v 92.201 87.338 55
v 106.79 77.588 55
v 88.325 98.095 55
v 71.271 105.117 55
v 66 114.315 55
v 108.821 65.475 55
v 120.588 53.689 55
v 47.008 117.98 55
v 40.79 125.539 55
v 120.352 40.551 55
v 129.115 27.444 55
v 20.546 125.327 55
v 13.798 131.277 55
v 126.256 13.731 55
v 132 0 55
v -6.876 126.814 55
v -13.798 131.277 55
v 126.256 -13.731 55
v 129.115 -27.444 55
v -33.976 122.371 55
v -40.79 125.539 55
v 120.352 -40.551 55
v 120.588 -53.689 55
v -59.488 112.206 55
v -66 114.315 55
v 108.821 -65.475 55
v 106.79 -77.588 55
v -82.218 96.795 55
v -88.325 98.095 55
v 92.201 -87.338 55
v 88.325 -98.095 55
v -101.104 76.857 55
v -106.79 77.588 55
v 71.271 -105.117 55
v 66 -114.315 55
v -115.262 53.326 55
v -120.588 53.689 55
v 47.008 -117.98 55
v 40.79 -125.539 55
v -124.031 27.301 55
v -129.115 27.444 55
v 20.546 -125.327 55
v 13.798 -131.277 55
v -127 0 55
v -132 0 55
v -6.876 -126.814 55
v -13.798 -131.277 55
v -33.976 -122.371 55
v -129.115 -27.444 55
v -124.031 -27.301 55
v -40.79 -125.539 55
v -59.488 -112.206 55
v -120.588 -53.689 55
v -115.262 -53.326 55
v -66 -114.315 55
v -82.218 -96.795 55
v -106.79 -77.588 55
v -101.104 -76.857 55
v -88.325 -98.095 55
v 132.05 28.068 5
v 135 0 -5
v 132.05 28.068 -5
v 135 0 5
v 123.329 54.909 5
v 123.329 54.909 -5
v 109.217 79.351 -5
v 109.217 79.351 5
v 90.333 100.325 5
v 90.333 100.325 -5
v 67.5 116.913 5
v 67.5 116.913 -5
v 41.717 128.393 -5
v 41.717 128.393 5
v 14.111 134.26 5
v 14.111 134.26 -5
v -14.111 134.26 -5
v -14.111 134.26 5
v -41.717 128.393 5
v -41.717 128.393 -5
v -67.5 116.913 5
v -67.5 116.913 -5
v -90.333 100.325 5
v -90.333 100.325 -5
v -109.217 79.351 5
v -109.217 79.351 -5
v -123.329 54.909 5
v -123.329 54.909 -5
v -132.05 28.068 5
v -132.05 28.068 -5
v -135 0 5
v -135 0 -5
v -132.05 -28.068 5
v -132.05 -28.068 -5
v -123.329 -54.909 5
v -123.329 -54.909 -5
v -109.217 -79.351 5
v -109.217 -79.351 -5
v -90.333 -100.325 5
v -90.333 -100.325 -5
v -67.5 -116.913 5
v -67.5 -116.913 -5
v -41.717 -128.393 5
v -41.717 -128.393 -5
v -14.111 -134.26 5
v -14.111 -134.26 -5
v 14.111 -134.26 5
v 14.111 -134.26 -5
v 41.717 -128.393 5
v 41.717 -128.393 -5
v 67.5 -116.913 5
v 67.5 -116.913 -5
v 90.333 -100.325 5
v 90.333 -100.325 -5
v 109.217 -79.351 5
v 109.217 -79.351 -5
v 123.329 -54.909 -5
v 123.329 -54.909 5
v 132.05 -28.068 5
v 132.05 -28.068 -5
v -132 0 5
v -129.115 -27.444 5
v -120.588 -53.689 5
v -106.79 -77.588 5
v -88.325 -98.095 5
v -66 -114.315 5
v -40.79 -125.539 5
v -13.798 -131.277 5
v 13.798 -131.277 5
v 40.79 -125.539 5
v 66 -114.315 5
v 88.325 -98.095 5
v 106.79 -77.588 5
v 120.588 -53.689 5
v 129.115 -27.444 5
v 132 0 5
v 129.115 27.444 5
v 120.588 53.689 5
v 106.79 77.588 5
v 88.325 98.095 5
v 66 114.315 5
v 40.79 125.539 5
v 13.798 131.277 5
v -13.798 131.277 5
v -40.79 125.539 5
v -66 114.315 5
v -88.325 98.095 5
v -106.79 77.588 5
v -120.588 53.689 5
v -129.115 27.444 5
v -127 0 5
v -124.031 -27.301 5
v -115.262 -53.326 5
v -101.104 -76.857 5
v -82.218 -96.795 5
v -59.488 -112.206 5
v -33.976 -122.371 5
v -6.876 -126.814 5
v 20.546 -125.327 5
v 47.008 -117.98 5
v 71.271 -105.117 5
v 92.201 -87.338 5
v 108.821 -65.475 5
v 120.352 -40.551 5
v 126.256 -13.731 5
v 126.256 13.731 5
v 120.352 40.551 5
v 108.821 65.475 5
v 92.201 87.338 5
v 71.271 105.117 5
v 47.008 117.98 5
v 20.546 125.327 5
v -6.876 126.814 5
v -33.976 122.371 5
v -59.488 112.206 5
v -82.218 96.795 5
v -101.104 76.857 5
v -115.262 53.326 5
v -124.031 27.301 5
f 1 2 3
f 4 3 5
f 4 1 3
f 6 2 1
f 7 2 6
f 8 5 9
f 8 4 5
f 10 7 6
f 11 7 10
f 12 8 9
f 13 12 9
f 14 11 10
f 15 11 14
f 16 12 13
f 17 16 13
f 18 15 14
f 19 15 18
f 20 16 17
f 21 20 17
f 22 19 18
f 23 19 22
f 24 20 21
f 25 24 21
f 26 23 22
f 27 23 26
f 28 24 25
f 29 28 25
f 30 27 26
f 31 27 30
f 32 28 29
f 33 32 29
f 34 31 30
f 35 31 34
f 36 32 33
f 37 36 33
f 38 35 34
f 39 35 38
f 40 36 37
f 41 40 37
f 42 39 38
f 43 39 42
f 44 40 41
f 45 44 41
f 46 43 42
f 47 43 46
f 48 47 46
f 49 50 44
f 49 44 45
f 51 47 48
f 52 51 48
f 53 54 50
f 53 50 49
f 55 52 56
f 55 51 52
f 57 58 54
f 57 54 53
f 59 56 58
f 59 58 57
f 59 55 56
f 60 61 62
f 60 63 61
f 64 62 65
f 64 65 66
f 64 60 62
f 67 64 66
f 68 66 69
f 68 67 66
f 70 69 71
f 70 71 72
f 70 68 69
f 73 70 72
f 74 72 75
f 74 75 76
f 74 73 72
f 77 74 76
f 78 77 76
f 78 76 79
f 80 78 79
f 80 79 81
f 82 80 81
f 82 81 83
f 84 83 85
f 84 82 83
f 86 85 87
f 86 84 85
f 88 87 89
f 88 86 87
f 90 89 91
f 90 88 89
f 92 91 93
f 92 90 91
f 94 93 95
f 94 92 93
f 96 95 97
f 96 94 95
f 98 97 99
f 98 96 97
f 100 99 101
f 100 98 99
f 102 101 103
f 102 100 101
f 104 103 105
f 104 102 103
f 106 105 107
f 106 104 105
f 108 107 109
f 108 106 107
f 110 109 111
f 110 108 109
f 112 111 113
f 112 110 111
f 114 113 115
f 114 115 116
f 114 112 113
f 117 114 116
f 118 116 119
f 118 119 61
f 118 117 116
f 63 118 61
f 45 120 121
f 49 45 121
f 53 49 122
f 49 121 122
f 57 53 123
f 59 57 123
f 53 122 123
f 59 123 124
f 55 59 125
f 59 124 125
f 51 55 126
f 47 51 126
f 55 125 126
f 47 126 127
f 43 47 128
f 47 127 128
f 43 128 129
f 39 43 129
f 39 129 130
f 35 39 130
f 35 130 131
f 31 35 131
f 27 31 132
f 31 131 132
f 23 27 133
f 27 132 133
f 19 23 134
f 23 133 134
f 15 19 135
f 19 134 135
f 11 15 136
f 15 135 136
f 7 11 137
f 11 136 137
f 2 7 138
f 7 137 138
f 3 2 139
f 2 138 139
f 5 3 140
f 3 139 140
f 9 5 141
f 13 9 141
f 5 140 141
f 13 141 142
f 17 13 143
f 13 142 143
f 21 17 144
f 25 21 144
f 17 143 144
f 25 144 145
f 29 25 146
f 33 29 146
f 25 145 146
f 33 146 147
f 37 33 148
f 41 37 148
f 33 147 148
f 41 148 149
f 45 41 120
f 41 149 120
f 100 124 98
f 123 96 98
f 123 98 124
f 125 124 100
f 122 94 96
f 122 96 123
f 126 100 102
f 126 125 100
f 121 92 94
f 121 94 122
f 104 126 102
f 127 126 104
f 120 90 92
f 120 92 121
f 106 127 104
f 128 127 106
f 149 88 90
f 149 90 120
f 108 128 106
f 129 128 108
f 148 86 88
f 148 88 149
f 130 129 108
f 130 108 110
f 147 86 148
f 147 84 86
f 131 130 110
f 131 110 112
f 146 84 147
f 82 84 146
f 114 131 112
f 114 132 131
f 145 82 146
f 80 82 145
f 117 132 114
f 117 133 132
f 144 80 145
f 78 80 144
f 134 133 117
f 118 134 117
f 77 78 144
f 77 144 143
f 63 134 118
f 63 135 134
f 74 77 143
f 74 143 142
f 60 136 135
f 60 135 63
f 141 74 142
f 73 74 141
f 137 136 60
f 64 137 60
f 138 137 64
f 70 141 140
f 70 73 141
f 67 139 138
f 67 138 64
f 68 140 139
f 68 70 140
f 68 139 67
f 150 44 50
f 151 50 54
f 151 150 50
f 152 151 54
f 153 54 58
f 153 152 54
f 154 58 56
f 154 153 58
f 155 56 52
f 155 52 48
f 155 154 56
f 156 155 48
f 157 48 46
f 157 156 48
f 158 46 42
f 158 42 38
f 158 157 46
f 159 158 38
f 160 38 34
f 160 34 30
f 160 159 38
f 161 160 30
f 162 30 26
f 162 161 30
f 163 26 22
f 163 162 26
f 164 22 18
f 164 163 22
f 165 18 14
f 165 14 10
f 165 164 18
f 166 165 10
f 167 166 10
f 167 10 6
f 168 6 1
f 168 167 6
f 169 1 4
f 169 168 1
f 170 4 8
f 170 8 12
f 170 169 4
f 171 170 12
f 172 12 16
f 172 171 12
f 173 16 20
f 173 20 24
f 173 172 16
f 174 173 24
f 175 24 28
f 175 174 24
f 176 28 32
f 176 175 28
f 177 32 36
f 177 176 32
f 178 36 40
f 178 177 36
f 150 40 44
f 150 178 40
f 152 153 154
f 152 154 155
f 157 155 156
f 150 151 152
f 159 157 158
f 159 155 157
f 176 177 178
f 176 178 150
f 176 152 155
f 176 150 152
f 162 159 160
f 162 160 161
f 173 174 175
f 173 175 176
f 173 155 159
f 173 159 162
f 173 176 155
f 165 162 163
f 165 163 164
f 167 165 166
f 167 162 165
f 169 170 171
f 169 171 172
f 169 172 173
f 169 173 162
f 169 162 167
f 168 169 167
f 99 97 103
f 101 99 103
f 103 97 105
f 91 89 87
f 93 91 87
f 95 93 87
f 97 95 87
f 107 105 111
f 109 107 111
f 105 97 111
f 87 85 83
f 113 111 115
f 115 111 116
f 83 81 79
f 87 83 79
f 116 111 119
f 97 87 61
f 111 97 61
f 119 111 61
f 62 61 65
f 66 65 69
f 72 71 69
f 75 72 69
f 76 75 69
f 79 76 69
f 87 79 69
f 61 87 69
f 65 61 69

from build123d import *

# Parameters (mm, degrees)
SKETCH1_R           = 135
BOSS_EXTRUDE1_DEPTH = 5
SKETCH2_R           = 132
SKETCH2_R_2         = 127
BOSS_EXTRUDE2_DEPTH = 50


with BuildPart() as part:
    # Sketch1 → Boss-Extrude1 (new, symmetric)
    with BuildSketch(Plane.XY):
        Circle(SKETCH1_R)
    extrude(amount=BOSS_EXTRUDE1_DEPTH, both=True)

    # Sketch2 → Boss-Extrude2 (add)
    with BuildSketch(Plane.XY.offset(5)):
        with Locations(Location((0, 0, 0), (0, 0, 180))):
            Circle(SKETCH2_R)
        with Locations(Location((0, 0, 0), (0, 0, 180))):
            Circle(SKETCH2_R_2, mode=Mode.SUBTRACT)
    extrude(amount=BOSS_EXTRUDE2_DEPTH)


solid = part.part
